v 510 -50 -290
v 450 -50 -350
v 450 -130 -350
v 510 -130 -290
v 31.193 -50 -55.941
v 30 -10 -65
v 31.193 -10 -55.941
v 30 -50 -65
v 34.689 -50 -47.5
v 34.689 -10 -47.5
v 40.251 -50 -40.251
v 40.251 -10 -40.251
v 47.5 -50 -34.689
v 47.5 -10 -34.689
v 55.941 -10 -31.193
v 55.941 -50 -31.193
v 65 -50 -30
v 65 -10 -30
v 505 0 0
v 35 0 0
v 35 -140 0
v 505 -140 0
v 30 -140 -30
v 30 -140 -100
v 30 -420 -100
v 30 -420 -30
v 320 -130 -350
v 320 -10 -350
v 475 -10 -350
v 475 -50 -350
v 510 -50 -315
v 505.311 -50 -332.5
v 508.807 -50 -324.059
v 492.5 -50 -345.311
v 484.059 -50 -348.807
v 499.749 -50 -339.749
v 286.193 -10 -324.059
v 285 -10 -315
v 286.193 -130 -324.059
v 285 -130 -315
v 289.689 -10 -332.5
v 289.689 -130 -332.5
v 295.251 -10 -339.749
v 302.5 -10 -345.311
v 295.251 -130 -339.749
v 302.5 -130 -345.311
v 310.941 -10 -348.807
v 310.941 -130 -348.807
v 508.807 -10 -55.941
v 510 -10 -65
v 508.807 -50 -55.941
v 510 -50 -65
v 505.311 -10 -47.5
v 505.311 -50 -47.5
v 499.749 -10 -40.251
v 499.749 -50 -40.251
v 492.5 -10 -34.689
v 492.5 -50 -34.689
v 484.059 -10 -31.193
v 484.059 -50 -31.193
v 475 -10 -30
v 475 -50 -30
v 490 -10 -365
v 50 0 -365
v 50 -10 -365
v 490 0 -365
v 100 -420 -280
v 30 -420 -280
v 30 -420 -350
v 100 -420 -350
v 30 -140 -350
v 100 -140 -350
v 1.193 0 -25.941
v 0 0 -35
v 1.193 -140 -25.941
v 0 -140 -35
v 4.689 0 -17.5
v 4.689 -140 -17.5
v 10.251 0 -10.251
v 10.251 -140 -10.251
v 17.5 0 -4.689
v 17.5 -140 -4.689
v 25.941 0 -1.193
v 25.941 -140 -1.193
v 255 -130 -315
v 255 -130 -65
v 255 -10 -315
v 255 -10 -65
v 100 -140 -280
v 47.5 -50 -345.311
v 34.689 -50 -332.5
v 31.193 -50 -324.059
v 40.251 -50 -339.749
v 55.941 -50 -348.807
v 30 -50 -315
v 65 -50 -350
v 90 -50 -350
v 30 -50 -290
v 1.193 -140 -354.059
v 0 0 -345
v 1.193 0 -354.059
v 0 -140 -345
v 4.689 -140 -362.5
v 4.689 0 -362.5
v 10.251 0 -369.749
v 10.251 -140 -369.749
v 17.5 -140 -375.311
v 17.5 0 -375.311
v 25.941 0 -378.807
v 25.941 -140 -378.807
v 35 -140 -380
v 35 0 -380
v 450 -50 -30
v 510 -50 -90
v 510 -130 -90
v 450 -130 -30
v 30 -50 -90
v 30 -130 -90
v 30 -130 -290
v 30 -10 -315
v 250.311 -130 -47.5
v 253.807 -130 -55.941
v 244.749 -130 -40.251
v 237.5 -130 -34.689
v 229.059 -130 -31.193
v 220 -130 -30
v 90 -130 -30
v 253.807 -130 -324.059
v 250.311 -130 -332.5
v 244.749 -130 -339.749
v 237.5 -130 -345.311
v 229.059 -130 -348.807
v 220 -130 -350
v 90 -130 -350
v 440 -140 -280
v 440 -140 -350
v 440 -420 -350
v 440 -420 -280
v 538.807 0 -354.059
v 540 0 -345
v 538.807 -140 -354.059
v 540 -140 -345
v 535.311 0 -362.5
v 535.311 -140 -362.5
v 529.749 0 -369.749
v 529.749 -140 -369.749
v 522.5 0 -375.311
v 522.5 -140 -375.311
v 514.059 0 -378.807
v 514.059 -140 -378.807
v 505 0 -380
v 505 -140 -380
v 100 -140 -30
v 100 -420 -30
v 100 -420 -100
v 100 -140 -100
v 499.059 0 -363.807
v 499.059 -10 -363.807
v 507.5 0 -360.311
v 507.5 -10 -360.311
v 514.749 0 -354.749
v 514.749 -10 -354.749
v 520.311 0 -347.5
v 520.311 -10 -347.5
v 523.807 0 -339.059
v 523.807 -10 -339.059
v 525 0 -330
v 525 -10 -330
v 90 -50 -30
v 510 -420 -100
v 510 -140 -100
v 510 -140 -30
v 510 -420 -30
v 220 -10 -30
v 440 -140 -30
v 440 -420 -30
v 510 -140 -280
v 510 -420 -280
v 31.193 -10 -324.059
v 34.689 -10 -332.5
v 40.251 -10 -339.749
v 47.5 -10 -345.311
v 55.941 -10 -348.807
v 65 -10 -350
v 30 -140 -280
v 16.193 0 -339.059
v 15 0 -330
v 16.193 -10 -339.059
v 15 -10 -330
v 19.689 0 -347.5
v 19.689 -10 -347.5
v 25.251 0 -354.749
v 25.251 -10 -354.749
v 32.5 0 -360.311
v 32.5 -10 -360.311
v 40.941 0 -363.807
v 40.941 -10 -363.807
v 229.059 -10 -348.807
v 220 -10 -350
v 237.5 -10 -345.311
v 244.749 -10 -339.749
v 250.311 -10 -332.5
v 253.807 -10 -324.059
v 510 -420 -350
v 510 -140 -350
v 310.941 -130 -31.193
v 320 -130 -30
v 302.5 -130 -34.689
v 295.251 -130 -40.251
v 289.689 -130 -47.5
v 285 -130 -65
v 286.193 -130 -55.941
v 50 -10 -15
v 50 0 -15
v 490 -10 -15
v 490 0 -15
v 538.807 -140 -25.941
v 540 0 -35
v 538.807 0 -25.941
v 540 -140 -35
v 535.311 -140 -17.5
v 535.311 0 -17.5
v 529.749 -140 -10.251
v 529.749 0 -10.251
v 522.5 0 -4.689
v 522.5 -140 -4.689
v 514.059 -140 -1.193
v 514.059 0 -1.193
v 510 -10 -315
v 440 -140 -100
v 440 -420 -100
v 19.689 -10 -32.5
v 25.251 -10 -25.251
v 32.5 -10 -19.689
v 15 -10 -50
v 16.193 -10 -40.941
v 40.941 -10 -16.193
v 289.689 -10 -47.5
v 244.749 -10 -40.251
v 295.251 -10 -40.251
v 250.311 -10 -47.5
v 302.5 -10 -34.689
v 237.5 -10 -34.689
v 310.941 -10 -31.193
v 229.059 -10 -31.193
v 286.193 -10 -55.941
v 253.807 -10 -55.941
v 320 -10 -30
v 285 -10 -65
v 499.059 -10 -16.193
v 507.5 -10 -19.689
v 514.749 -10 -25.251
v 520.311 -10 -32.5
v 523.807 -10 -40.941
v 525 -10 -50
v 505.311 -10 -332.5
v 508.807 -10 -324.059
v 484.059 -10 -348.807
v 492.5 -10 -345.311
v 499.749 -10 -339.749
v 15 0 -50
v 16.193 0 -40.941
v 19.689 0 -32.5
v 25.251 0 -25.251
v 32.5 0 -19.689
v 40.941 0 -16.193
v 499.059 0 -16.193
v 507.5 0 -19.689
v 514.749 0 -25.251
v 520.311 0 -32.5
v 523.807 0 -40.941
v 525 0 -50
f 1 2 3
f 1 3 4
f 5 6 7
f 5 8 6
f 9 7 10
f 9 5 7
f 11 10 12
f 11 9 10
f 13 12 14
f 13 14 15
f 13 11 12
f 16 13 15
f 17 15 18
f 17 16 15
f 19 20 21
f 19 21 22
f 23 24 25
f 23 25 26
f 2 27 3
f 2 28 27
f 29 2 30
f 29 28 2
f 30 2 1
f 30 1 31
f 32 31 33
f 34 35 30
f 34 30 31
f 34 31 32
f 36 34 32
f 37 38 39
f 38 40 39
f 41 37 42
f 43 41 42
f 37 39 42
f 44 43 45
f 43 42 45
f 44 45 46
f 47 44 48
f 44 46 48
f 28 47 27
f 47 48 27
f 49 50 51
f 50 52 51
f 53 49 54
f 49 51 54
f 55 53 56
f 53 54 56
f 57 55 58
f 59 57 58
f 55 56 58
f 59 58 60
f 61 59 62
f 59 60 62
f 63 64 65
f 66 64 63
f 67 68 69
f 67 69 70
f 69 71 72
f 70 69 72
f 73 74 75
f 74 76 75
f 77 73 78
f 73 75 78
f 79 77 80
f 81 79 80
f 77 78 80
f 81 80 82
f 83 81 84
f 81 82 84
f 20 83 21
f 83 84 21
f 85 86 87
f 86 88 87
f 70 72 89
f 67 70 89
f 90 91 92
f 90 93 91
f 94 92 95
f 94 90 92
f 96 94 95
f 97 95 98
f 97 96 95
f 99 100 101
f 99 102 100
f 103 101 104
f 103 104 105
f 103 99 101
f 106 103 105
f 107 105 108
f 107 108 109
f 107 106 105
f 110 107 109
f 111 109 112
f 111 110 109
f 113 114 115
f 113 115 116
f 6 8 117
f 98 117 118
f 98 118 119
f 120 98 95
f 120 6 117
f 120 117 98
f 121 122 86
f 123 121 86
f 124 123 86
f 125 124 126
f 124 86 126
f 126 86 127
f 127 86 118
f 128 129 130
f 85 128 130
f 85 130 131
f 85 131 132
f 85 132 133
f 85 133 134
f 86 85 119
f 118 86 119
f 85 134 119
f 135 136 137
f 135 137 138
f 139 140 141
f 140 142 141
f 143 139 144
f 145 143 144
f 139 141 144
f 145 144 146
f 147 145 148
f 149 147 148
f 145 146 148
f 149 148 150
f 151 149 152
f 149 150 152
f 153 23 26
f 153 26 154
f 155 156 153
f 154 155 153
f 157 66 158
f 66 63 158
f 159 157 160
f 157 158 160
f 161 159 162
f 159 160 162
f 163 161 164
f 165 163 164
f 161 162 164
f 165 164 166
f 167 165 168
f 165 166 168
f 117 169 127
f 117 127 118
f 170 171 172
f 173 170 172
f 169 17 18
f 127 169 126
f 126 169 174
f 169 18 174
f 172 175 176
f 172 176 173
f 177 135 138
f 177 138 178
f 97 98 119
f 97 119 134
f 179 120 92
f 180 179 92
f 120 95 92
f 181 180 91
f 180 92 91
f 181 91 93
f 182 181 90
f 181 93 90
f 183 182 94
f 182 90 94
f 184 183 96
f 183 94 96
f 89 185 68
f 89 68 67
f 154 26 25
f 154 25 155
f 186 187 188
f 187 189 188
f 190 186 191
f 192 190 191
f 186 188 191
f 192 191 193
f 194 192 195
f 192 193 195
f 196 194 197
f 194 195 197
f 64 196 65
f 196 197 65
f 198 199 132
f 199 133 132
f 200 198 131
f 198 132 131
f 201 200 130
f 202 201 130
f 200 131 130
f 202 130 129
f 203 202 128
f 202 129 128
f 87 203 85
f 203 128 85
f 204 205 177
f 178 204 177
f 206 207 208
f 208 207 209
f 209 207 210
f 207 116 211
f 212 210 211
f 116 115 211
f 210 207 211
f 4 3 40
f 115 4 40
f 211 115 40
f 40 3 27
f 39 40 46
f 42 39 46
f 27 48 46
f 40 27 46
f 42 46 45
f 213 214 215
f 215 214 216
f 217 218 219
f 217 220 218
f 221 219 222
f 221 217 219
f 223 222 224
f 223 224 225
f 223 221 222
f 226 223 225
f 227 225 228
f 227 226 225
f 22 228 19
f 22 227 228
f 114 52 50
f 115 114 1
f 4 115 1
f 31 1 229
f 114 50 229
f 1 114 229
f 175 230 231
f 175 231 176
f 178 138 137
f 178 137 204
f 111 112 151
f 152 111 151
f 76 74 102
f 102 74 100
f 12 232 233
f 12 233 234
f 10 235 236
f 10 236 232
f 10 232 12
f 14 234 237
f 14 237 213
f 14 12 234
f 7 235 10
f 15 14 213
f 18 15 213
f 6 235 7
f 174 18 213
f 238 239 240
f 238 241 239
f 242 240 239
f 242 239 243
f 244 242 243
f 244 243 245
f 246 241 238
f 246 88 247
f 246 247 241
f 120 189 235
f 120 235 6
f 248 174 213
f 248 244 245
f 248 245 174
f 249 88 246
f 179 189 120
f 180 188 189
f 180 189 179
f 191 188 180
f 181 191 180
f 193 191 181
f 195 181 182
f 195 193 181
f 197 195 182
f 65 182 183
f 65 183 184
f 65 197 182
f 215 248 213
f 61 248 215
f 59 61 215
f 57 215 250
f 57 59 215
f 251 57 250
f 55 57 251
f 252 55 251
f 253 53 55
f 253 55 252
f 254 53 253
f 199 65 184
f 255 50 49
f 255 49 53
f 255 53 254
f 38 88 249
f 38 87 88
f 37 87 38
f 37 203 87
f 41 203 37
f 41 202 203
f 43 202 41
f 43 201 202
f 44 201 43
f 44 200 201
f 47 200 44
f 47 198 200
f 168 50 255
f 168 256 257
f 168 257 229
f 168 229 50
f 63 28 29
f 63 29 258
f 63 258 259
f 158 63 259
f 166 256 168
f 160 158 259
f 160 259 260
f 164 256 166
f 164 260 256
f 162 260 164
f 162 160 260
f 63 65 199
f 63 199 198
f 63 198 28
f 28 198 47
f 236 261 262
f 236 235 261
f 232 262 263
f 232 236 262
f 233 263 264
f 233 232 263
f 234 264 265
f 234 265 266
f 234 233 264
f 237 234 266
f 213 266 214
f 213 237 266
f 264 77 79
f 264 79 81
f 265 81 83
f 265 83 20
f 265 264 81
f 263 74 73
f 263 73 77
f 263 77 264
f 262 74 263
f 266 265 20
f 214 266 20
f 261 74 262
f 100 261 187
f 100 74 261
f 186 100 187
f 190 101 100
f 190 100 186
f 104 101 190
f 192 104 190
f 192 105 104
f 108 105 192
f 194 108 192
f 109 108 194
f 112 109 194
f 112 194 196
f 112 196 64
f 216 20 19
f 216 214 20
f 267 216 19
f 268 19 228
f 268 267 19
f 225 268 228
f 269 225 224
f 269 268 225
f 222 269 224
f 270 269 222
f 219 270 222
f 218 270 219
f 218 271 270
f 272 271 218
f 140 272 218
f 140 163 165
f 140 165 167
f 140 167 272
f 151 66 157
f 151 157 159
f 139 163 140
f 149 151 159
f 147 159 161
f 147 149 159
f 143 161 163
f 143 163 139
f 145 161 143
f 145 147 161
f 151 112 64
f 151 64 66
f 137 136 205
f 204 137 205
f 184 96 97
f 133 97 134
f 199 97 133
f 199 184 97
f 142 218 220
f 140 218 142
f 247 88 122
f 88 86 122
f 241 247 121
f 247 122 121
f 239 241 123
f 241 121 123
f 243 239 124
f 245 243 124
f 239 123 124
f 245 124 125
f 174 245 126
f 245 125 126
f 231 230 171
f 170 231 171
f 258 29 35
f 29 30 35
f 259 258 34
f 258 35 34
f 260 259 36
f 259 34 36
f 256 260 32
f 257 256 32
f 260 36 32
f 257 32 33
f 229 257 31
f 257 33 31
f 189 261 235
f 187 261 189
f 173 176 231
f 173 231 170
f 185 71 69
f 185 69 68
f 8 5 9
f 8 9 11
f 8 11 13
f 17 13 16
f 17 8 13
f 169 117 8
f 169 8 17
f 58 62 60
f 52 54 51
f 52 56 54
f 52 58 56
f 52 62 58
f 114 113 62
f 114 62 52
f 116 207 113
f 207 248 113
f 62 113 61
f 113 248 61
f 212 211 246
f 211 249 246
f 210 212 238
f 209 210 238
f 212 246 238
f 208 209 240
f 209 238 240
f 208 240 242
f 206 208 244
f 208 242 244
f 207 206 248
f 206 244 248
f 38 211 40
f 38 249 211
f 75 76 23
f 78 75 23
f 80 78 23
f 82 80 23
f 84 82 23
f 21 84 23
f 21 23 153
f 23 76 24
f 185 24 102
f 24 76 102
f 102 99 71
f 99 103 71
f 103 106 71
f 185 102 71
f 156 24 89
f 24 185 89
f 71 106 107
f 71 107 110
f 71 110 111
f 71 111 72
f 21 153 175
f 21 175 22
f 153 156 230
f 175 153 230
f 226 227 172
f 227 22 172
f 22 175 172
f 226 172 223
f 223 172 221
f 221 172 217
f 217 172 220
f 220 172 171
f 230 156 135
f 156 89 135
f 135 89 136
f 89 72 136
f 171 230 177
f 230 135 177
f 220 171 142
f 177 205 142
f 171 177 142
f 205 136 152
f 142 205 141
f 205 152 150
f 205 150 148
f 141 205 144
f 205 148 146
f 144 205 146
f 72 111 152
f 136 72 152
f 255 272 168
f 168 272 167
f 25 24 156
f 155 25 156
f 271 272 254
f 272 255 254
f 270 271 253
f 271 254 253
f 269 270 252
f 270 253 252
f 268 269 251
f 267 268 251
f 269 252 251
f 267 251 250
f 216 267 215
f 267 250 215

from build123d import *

# Parameters (mm, degrees)
SKETCH1_W           = 540
SKETCH1_H           = 380
BOSS_EXTRUDE1_DEPTH = 140
SKETCH3_W           = 510
SKETCH3_H           = 350
CUT_EXTRUDE1_DEPTH  = 10
SKETCH2_W           = 225
SKETCH2_H           = 320
CUT_EXTRUDE2_DEPTH  = 40
CUT_EXTRUDE3_DEPTH  = 80
FILLET1_R           = 35
SKETCH6_W           = 70
SKETCH6_H           = 70
BOSS_EXTRUDE2_DEPTH = 280


with BuildPart() as part:
    # Sketch1 → Boss-Extrude1 (new body)
    with BuildSketch(Plane(origin=(0, 0, 0), x_dir=(1, 0, 0), z_dir=(0, 1, 0))):
        with Locations((270, 190)):
            Rectangle(SKETCH1_W, SKETCH1_H)
    extrude(amount=-BOSS_EXTRUDE1_DEPTH)

    # Sketch3 → Cut-Extrude1 (cut)
    with BuildSketch(Plane(origin=(0, 0, 0), x_dir=(1, 0, 0), z_dir=(0, 1, 0))):
        with Locations((270, 190)):
            Rectangle(SKETCH3_W, SKETCH3_H)
    extrude(amount=-CUT_EXTRUDE1_DEPTH, mode=Mode.SUBTRACT)

    # Sketch2 → Cut-Extrude2 (cut)
    with BuildSketch(Plane(origin=(0, -10, 0), x_dir=(1, 0, 0), z_dir=(0, 1, 0))):
        with Locations((142.5, 190)):
            Rectangle(SKETCH2_W, SKETCH2_H)
        with Locations((397.5, 190)):
            Rectangle(SKETCH2_W, SKETCH2_H)
    extrude(amount=-CUT_EXTRUDE2_DEPTH, mode=Mode.SUBTRACT)

    # Sketch5 → Cut-Extrude3 (cut)
    with BuildSketch(Plane(origin=(0, -50, 0), x_dir=(1, 0, 0), z_dir=(0, 1, 0))):
        Polygon((30, 290), (90, 350), (255, 350), (255, 30), (90, 30), (30, 90), align=None)
        Polygon((510, 90), (450, 30), (285, 30), (285, 350), (450, 350), (510, 290), align=None)
    extrude(amount=-CUT_EXTRUDE3_DEPTH, mode=Mode.SUBTRACT)

    # Fillet1
    fillet1_edges = [part.edges().sort_by_distance(p)[0] for p in [
        (15, -5, -15),
        (15, -5, -365),
        (525, -5, -365),
        (525, -5, -15),
        (30, -30, -30),
        (30, -30, -350),
        (255, -70, -350),
        (255, -70, -30),
        (510, -30, -350),
        (510, -30, -30),
        (285, -70, -30),
        (285, -70, -350),
        (0, -70, -380),
        (540, -70, -380),
        (540, -70, 0),
        (0, -70, 0),
    ]]
    fillet(fillet1_edges, radius=FILLET1_R)

    # Sketch6 → Boss-Extrude2 (add)
    with BuildSketch(Plane.XZ.offset(140)):
        with Locations((65, -65)):
            Rectangle(SKETCH6_W, SKETCH6_H)
        with Locations((475, -65)):
            Rectangle(SKETCH6_W, SKETCH6_H)
        with Locations((475, -315)):
            Rectangle(SKETCH6_W, SKETCH6_H)
        with Locations((65, -315)):
            Rectangle(SKETCH6_W, SKETCH6_H)
    extrude(amount=BOSS_EXTRUDE2_DEPTH)


solid = part.part
